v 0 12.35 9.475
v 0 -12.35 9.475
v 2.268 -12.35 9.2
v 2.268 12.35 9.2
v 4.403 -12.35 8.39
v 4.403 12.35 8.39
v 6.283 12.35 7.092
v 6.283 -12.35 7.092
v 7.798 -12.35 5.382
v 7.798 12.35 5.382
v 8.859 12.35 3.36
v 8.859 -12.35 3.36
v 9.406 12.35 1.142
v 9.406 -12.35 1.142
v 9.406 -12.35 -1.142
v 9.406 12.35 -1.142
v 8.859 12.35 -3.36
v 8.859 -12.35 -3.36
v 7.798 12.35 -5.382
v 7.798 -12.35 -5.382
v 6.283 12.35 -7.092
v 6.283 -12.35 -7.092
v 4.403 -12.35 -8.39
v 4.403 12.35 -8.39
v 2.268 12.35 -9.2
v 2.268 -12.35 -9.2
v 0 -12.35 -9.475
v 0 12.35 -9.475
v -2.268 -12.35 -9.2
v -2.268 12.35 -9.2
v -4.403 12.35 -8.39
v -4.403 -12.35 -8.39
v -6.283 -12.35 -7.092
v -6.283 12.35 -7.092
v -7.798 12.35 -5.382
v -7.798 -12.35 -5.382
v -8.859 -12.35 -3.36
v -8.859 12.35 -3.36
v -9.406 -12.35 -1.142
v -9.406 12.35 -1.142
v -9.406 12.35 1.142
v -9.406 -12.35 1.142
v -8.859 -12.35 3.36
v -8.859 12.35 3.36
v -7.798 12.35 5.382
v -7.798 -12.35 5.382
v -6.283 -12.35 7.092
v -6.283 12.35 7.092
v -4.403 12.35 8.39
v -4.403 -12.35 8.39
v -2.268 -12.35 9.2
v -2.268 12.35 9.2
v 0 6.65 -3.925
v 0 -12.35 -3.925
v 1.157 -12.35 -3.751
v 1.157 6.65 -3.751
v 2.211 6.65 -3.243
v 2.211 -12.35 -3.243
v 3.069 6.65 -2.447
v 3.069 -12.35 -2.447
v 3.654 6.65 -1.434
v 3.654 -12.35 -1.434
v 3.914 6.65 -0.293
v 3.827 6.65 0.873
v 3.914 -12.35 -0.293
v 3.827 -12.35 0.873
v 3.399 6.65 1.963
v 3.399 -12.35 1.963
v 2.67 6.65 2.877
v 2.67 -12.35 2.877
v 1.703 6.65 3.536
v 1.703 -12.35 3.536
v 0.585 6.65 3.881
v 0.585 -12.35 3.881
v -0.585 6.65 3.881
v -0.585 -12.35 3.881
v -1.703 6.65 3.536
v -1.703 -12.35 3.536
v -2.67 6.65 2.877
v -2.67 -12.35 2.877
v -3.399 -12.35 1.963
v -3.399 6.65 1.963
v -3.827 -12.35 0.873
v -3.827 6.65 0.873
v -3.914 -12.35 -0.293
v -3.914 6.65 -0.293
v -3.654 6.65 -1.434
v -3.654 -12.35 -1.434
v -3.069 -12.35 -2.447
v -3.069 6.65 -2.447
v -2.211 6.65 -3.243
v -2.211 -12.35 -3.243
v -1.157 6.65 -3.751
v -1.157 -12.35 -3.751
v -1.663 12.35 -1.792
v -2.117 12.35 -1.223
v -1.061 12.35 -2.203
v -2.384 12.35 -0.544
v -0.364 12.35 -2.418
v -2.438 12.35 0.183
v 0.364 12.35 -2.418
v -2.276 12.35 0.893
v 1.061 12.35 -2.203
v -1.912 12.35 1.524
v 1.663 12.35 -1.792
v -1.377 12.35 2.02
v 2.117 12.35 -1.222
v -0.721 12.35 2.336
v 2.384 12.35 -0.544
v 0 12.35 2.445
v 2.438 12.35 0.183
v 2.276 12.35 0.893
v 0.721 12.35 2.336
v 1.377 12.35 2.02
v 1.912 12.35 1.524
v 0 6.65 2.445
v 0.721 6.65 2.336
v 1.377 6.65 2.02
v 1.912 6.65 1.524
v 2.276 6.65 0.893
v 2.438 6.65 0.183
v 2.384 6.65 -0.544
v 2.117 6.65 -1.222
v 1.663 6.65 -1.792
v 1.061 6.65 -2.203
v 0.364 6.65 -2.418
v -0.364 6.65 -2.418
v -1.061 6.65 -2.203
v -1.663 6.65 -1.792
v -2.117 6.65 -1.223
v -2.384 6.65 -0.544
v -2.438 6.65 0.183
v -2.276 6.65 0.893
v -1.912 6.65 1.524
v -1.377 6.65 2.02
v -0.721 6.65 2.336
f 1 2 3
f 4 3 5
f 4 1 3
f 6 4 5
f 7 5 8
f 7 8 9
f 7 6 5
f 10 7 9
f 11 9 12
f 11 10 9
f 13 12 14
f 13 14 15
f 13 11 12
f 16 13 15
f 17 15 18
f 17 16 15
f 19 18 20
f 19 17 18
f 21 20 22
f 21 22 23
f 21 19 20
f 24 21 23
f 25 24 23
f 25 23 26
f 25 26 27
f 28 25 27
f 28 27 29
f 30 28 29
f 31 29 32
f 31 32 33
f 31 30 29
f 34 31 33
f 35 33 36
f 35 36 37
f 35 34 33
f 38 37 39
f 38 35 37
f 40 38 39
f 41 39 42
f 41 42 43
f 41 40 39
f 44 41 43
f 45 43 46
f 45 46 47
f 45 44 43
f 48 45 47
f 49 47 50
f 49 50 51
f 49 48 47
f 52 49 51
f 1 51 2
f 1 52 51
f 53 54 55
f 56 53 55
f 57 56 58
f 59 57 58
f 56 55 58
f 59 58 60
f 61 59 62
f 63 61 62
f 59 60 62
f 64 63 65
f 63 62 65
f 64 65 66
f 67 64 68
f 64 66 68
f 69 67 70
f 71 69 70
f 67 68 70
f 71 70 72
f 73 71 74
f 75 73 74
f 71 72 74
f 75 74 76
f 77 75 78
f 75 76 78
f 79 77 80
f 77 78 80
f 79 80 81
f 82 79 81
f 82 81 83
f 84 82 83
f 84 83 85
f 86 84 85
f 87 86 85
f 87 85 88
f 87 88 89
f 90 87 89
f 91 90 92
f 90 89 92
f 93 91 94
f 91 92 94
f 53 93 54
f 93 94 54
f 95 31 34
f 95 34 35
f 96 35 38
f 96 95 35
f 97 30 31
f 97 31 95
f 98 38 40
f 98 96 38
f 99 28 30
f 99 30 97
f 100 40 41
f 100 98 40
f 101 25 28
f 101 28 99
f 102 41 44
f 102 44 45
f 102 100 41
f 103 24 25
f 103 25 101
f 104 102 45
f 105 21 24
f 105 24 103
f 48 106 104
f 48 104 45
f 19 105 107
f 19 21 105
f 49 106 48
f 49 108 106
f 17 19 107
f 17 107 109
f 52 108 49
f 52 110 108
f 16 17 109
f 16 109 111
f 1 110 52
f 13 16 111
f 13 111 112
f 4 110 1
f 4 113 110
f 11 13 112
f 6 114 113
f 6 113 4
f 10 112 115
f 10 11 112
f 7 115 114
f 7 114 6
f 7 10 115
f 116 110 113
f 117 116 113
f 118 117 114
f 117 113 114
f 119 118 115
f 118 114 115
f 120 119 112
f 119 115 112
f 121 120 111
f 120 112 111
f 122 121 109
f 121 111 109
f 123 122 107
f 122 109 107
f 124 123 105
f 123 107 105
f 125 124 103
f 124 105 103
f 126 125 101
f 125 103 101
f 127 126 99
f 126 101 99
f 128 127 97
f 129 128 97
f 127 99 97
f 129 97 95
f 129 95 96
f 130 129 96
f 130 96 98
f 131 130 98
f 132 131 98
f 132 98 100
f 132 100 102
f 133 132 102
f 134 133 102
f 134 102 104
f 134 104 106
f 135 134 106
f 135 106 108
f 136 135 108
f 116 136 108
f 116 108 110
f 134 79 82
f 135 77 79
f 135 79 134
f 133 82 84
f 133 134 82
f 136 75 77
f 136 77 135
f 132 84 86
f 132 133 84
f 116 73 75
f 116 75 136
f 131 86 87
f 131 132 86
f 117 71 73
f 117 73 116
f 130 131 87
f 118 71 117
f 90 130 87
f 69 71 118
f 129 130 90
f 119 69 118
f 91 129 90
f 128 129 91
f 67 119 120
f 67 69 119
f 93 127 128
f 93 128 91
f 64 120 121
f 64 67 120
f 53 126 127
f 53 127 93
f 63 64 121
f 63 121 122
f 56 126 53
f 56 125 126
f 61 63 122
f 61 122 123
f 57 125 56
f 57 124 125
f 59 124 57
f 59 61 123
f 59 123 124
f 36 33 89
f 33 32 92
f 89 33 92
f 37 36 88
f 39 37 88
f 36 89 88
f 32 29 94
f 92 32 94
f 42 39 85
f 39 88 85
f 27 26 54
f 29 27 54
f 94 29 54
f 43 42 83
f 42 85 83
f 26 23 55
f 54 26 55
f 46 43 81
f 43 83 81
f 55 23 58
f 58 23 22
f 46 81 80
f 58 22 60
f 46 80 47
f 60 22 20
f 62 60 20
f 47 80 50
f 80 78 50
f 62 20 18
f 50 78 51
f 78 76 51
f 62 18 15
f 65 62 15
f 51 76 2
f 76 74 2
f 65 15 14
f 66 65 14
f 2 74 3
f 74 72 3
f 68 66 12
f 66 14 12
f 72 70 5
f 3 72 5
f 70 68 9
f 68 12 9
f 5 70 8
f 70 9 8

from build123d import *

# Parameters (mm, degrees)
SKETCH1_R           = 9.475
BOSS_EXTRUDE1_DEPTH = 12.35
SKETCH2_R           = 2.445
CUT_EXTRUDE1_DEPTH  = 10
SKETCH3_R           = 3.925
CUT_EXTRUDE2_DEPTH  = 19


with BuildPart() as part:
    # Sketch1 → Boss-Extrude1 (new, symmetric)
    with BuildSketch(Plane(origin=(0, 0, 0), x_dir=(1, 0, 0), z_dir=(0, 1, 0))):
        with Locations(Location((0, 0, 0), (0, 0, 270))):
            Circle(SKETCH1_R)
    extrude(amount=BOSS_EXTRUDE1_DEPTH, both=True)

    # Sketch2 → Cut-Extrude1 (cut)
    with BuildSketch(Plane(origin=(0, 12.35, 0), x_dir=(1, 0, 0), z_dir=(0, 1, 0))):
        with Locations(Location((0, 0, 0), (0, 0, 270))):
            Circle(SKETCH2_R)
    extrude(amount=-CUT_EXTRUDE1_DEPTH, mode=Mode.SUBTRACT)

    # Sketch3 → Cut-Extrude2 (cut)
    with BuildSketch(Plane.XZ.offset(12.35)):
        with Locations(Location((0, 0, 0), (0, 0, 270))):
            Circle(SKETCH3_R)
    extrude(amount=-CUT_EXTRUDE2_DEPTH, mode=Mode.SUBTRACT)


solid = part.part
